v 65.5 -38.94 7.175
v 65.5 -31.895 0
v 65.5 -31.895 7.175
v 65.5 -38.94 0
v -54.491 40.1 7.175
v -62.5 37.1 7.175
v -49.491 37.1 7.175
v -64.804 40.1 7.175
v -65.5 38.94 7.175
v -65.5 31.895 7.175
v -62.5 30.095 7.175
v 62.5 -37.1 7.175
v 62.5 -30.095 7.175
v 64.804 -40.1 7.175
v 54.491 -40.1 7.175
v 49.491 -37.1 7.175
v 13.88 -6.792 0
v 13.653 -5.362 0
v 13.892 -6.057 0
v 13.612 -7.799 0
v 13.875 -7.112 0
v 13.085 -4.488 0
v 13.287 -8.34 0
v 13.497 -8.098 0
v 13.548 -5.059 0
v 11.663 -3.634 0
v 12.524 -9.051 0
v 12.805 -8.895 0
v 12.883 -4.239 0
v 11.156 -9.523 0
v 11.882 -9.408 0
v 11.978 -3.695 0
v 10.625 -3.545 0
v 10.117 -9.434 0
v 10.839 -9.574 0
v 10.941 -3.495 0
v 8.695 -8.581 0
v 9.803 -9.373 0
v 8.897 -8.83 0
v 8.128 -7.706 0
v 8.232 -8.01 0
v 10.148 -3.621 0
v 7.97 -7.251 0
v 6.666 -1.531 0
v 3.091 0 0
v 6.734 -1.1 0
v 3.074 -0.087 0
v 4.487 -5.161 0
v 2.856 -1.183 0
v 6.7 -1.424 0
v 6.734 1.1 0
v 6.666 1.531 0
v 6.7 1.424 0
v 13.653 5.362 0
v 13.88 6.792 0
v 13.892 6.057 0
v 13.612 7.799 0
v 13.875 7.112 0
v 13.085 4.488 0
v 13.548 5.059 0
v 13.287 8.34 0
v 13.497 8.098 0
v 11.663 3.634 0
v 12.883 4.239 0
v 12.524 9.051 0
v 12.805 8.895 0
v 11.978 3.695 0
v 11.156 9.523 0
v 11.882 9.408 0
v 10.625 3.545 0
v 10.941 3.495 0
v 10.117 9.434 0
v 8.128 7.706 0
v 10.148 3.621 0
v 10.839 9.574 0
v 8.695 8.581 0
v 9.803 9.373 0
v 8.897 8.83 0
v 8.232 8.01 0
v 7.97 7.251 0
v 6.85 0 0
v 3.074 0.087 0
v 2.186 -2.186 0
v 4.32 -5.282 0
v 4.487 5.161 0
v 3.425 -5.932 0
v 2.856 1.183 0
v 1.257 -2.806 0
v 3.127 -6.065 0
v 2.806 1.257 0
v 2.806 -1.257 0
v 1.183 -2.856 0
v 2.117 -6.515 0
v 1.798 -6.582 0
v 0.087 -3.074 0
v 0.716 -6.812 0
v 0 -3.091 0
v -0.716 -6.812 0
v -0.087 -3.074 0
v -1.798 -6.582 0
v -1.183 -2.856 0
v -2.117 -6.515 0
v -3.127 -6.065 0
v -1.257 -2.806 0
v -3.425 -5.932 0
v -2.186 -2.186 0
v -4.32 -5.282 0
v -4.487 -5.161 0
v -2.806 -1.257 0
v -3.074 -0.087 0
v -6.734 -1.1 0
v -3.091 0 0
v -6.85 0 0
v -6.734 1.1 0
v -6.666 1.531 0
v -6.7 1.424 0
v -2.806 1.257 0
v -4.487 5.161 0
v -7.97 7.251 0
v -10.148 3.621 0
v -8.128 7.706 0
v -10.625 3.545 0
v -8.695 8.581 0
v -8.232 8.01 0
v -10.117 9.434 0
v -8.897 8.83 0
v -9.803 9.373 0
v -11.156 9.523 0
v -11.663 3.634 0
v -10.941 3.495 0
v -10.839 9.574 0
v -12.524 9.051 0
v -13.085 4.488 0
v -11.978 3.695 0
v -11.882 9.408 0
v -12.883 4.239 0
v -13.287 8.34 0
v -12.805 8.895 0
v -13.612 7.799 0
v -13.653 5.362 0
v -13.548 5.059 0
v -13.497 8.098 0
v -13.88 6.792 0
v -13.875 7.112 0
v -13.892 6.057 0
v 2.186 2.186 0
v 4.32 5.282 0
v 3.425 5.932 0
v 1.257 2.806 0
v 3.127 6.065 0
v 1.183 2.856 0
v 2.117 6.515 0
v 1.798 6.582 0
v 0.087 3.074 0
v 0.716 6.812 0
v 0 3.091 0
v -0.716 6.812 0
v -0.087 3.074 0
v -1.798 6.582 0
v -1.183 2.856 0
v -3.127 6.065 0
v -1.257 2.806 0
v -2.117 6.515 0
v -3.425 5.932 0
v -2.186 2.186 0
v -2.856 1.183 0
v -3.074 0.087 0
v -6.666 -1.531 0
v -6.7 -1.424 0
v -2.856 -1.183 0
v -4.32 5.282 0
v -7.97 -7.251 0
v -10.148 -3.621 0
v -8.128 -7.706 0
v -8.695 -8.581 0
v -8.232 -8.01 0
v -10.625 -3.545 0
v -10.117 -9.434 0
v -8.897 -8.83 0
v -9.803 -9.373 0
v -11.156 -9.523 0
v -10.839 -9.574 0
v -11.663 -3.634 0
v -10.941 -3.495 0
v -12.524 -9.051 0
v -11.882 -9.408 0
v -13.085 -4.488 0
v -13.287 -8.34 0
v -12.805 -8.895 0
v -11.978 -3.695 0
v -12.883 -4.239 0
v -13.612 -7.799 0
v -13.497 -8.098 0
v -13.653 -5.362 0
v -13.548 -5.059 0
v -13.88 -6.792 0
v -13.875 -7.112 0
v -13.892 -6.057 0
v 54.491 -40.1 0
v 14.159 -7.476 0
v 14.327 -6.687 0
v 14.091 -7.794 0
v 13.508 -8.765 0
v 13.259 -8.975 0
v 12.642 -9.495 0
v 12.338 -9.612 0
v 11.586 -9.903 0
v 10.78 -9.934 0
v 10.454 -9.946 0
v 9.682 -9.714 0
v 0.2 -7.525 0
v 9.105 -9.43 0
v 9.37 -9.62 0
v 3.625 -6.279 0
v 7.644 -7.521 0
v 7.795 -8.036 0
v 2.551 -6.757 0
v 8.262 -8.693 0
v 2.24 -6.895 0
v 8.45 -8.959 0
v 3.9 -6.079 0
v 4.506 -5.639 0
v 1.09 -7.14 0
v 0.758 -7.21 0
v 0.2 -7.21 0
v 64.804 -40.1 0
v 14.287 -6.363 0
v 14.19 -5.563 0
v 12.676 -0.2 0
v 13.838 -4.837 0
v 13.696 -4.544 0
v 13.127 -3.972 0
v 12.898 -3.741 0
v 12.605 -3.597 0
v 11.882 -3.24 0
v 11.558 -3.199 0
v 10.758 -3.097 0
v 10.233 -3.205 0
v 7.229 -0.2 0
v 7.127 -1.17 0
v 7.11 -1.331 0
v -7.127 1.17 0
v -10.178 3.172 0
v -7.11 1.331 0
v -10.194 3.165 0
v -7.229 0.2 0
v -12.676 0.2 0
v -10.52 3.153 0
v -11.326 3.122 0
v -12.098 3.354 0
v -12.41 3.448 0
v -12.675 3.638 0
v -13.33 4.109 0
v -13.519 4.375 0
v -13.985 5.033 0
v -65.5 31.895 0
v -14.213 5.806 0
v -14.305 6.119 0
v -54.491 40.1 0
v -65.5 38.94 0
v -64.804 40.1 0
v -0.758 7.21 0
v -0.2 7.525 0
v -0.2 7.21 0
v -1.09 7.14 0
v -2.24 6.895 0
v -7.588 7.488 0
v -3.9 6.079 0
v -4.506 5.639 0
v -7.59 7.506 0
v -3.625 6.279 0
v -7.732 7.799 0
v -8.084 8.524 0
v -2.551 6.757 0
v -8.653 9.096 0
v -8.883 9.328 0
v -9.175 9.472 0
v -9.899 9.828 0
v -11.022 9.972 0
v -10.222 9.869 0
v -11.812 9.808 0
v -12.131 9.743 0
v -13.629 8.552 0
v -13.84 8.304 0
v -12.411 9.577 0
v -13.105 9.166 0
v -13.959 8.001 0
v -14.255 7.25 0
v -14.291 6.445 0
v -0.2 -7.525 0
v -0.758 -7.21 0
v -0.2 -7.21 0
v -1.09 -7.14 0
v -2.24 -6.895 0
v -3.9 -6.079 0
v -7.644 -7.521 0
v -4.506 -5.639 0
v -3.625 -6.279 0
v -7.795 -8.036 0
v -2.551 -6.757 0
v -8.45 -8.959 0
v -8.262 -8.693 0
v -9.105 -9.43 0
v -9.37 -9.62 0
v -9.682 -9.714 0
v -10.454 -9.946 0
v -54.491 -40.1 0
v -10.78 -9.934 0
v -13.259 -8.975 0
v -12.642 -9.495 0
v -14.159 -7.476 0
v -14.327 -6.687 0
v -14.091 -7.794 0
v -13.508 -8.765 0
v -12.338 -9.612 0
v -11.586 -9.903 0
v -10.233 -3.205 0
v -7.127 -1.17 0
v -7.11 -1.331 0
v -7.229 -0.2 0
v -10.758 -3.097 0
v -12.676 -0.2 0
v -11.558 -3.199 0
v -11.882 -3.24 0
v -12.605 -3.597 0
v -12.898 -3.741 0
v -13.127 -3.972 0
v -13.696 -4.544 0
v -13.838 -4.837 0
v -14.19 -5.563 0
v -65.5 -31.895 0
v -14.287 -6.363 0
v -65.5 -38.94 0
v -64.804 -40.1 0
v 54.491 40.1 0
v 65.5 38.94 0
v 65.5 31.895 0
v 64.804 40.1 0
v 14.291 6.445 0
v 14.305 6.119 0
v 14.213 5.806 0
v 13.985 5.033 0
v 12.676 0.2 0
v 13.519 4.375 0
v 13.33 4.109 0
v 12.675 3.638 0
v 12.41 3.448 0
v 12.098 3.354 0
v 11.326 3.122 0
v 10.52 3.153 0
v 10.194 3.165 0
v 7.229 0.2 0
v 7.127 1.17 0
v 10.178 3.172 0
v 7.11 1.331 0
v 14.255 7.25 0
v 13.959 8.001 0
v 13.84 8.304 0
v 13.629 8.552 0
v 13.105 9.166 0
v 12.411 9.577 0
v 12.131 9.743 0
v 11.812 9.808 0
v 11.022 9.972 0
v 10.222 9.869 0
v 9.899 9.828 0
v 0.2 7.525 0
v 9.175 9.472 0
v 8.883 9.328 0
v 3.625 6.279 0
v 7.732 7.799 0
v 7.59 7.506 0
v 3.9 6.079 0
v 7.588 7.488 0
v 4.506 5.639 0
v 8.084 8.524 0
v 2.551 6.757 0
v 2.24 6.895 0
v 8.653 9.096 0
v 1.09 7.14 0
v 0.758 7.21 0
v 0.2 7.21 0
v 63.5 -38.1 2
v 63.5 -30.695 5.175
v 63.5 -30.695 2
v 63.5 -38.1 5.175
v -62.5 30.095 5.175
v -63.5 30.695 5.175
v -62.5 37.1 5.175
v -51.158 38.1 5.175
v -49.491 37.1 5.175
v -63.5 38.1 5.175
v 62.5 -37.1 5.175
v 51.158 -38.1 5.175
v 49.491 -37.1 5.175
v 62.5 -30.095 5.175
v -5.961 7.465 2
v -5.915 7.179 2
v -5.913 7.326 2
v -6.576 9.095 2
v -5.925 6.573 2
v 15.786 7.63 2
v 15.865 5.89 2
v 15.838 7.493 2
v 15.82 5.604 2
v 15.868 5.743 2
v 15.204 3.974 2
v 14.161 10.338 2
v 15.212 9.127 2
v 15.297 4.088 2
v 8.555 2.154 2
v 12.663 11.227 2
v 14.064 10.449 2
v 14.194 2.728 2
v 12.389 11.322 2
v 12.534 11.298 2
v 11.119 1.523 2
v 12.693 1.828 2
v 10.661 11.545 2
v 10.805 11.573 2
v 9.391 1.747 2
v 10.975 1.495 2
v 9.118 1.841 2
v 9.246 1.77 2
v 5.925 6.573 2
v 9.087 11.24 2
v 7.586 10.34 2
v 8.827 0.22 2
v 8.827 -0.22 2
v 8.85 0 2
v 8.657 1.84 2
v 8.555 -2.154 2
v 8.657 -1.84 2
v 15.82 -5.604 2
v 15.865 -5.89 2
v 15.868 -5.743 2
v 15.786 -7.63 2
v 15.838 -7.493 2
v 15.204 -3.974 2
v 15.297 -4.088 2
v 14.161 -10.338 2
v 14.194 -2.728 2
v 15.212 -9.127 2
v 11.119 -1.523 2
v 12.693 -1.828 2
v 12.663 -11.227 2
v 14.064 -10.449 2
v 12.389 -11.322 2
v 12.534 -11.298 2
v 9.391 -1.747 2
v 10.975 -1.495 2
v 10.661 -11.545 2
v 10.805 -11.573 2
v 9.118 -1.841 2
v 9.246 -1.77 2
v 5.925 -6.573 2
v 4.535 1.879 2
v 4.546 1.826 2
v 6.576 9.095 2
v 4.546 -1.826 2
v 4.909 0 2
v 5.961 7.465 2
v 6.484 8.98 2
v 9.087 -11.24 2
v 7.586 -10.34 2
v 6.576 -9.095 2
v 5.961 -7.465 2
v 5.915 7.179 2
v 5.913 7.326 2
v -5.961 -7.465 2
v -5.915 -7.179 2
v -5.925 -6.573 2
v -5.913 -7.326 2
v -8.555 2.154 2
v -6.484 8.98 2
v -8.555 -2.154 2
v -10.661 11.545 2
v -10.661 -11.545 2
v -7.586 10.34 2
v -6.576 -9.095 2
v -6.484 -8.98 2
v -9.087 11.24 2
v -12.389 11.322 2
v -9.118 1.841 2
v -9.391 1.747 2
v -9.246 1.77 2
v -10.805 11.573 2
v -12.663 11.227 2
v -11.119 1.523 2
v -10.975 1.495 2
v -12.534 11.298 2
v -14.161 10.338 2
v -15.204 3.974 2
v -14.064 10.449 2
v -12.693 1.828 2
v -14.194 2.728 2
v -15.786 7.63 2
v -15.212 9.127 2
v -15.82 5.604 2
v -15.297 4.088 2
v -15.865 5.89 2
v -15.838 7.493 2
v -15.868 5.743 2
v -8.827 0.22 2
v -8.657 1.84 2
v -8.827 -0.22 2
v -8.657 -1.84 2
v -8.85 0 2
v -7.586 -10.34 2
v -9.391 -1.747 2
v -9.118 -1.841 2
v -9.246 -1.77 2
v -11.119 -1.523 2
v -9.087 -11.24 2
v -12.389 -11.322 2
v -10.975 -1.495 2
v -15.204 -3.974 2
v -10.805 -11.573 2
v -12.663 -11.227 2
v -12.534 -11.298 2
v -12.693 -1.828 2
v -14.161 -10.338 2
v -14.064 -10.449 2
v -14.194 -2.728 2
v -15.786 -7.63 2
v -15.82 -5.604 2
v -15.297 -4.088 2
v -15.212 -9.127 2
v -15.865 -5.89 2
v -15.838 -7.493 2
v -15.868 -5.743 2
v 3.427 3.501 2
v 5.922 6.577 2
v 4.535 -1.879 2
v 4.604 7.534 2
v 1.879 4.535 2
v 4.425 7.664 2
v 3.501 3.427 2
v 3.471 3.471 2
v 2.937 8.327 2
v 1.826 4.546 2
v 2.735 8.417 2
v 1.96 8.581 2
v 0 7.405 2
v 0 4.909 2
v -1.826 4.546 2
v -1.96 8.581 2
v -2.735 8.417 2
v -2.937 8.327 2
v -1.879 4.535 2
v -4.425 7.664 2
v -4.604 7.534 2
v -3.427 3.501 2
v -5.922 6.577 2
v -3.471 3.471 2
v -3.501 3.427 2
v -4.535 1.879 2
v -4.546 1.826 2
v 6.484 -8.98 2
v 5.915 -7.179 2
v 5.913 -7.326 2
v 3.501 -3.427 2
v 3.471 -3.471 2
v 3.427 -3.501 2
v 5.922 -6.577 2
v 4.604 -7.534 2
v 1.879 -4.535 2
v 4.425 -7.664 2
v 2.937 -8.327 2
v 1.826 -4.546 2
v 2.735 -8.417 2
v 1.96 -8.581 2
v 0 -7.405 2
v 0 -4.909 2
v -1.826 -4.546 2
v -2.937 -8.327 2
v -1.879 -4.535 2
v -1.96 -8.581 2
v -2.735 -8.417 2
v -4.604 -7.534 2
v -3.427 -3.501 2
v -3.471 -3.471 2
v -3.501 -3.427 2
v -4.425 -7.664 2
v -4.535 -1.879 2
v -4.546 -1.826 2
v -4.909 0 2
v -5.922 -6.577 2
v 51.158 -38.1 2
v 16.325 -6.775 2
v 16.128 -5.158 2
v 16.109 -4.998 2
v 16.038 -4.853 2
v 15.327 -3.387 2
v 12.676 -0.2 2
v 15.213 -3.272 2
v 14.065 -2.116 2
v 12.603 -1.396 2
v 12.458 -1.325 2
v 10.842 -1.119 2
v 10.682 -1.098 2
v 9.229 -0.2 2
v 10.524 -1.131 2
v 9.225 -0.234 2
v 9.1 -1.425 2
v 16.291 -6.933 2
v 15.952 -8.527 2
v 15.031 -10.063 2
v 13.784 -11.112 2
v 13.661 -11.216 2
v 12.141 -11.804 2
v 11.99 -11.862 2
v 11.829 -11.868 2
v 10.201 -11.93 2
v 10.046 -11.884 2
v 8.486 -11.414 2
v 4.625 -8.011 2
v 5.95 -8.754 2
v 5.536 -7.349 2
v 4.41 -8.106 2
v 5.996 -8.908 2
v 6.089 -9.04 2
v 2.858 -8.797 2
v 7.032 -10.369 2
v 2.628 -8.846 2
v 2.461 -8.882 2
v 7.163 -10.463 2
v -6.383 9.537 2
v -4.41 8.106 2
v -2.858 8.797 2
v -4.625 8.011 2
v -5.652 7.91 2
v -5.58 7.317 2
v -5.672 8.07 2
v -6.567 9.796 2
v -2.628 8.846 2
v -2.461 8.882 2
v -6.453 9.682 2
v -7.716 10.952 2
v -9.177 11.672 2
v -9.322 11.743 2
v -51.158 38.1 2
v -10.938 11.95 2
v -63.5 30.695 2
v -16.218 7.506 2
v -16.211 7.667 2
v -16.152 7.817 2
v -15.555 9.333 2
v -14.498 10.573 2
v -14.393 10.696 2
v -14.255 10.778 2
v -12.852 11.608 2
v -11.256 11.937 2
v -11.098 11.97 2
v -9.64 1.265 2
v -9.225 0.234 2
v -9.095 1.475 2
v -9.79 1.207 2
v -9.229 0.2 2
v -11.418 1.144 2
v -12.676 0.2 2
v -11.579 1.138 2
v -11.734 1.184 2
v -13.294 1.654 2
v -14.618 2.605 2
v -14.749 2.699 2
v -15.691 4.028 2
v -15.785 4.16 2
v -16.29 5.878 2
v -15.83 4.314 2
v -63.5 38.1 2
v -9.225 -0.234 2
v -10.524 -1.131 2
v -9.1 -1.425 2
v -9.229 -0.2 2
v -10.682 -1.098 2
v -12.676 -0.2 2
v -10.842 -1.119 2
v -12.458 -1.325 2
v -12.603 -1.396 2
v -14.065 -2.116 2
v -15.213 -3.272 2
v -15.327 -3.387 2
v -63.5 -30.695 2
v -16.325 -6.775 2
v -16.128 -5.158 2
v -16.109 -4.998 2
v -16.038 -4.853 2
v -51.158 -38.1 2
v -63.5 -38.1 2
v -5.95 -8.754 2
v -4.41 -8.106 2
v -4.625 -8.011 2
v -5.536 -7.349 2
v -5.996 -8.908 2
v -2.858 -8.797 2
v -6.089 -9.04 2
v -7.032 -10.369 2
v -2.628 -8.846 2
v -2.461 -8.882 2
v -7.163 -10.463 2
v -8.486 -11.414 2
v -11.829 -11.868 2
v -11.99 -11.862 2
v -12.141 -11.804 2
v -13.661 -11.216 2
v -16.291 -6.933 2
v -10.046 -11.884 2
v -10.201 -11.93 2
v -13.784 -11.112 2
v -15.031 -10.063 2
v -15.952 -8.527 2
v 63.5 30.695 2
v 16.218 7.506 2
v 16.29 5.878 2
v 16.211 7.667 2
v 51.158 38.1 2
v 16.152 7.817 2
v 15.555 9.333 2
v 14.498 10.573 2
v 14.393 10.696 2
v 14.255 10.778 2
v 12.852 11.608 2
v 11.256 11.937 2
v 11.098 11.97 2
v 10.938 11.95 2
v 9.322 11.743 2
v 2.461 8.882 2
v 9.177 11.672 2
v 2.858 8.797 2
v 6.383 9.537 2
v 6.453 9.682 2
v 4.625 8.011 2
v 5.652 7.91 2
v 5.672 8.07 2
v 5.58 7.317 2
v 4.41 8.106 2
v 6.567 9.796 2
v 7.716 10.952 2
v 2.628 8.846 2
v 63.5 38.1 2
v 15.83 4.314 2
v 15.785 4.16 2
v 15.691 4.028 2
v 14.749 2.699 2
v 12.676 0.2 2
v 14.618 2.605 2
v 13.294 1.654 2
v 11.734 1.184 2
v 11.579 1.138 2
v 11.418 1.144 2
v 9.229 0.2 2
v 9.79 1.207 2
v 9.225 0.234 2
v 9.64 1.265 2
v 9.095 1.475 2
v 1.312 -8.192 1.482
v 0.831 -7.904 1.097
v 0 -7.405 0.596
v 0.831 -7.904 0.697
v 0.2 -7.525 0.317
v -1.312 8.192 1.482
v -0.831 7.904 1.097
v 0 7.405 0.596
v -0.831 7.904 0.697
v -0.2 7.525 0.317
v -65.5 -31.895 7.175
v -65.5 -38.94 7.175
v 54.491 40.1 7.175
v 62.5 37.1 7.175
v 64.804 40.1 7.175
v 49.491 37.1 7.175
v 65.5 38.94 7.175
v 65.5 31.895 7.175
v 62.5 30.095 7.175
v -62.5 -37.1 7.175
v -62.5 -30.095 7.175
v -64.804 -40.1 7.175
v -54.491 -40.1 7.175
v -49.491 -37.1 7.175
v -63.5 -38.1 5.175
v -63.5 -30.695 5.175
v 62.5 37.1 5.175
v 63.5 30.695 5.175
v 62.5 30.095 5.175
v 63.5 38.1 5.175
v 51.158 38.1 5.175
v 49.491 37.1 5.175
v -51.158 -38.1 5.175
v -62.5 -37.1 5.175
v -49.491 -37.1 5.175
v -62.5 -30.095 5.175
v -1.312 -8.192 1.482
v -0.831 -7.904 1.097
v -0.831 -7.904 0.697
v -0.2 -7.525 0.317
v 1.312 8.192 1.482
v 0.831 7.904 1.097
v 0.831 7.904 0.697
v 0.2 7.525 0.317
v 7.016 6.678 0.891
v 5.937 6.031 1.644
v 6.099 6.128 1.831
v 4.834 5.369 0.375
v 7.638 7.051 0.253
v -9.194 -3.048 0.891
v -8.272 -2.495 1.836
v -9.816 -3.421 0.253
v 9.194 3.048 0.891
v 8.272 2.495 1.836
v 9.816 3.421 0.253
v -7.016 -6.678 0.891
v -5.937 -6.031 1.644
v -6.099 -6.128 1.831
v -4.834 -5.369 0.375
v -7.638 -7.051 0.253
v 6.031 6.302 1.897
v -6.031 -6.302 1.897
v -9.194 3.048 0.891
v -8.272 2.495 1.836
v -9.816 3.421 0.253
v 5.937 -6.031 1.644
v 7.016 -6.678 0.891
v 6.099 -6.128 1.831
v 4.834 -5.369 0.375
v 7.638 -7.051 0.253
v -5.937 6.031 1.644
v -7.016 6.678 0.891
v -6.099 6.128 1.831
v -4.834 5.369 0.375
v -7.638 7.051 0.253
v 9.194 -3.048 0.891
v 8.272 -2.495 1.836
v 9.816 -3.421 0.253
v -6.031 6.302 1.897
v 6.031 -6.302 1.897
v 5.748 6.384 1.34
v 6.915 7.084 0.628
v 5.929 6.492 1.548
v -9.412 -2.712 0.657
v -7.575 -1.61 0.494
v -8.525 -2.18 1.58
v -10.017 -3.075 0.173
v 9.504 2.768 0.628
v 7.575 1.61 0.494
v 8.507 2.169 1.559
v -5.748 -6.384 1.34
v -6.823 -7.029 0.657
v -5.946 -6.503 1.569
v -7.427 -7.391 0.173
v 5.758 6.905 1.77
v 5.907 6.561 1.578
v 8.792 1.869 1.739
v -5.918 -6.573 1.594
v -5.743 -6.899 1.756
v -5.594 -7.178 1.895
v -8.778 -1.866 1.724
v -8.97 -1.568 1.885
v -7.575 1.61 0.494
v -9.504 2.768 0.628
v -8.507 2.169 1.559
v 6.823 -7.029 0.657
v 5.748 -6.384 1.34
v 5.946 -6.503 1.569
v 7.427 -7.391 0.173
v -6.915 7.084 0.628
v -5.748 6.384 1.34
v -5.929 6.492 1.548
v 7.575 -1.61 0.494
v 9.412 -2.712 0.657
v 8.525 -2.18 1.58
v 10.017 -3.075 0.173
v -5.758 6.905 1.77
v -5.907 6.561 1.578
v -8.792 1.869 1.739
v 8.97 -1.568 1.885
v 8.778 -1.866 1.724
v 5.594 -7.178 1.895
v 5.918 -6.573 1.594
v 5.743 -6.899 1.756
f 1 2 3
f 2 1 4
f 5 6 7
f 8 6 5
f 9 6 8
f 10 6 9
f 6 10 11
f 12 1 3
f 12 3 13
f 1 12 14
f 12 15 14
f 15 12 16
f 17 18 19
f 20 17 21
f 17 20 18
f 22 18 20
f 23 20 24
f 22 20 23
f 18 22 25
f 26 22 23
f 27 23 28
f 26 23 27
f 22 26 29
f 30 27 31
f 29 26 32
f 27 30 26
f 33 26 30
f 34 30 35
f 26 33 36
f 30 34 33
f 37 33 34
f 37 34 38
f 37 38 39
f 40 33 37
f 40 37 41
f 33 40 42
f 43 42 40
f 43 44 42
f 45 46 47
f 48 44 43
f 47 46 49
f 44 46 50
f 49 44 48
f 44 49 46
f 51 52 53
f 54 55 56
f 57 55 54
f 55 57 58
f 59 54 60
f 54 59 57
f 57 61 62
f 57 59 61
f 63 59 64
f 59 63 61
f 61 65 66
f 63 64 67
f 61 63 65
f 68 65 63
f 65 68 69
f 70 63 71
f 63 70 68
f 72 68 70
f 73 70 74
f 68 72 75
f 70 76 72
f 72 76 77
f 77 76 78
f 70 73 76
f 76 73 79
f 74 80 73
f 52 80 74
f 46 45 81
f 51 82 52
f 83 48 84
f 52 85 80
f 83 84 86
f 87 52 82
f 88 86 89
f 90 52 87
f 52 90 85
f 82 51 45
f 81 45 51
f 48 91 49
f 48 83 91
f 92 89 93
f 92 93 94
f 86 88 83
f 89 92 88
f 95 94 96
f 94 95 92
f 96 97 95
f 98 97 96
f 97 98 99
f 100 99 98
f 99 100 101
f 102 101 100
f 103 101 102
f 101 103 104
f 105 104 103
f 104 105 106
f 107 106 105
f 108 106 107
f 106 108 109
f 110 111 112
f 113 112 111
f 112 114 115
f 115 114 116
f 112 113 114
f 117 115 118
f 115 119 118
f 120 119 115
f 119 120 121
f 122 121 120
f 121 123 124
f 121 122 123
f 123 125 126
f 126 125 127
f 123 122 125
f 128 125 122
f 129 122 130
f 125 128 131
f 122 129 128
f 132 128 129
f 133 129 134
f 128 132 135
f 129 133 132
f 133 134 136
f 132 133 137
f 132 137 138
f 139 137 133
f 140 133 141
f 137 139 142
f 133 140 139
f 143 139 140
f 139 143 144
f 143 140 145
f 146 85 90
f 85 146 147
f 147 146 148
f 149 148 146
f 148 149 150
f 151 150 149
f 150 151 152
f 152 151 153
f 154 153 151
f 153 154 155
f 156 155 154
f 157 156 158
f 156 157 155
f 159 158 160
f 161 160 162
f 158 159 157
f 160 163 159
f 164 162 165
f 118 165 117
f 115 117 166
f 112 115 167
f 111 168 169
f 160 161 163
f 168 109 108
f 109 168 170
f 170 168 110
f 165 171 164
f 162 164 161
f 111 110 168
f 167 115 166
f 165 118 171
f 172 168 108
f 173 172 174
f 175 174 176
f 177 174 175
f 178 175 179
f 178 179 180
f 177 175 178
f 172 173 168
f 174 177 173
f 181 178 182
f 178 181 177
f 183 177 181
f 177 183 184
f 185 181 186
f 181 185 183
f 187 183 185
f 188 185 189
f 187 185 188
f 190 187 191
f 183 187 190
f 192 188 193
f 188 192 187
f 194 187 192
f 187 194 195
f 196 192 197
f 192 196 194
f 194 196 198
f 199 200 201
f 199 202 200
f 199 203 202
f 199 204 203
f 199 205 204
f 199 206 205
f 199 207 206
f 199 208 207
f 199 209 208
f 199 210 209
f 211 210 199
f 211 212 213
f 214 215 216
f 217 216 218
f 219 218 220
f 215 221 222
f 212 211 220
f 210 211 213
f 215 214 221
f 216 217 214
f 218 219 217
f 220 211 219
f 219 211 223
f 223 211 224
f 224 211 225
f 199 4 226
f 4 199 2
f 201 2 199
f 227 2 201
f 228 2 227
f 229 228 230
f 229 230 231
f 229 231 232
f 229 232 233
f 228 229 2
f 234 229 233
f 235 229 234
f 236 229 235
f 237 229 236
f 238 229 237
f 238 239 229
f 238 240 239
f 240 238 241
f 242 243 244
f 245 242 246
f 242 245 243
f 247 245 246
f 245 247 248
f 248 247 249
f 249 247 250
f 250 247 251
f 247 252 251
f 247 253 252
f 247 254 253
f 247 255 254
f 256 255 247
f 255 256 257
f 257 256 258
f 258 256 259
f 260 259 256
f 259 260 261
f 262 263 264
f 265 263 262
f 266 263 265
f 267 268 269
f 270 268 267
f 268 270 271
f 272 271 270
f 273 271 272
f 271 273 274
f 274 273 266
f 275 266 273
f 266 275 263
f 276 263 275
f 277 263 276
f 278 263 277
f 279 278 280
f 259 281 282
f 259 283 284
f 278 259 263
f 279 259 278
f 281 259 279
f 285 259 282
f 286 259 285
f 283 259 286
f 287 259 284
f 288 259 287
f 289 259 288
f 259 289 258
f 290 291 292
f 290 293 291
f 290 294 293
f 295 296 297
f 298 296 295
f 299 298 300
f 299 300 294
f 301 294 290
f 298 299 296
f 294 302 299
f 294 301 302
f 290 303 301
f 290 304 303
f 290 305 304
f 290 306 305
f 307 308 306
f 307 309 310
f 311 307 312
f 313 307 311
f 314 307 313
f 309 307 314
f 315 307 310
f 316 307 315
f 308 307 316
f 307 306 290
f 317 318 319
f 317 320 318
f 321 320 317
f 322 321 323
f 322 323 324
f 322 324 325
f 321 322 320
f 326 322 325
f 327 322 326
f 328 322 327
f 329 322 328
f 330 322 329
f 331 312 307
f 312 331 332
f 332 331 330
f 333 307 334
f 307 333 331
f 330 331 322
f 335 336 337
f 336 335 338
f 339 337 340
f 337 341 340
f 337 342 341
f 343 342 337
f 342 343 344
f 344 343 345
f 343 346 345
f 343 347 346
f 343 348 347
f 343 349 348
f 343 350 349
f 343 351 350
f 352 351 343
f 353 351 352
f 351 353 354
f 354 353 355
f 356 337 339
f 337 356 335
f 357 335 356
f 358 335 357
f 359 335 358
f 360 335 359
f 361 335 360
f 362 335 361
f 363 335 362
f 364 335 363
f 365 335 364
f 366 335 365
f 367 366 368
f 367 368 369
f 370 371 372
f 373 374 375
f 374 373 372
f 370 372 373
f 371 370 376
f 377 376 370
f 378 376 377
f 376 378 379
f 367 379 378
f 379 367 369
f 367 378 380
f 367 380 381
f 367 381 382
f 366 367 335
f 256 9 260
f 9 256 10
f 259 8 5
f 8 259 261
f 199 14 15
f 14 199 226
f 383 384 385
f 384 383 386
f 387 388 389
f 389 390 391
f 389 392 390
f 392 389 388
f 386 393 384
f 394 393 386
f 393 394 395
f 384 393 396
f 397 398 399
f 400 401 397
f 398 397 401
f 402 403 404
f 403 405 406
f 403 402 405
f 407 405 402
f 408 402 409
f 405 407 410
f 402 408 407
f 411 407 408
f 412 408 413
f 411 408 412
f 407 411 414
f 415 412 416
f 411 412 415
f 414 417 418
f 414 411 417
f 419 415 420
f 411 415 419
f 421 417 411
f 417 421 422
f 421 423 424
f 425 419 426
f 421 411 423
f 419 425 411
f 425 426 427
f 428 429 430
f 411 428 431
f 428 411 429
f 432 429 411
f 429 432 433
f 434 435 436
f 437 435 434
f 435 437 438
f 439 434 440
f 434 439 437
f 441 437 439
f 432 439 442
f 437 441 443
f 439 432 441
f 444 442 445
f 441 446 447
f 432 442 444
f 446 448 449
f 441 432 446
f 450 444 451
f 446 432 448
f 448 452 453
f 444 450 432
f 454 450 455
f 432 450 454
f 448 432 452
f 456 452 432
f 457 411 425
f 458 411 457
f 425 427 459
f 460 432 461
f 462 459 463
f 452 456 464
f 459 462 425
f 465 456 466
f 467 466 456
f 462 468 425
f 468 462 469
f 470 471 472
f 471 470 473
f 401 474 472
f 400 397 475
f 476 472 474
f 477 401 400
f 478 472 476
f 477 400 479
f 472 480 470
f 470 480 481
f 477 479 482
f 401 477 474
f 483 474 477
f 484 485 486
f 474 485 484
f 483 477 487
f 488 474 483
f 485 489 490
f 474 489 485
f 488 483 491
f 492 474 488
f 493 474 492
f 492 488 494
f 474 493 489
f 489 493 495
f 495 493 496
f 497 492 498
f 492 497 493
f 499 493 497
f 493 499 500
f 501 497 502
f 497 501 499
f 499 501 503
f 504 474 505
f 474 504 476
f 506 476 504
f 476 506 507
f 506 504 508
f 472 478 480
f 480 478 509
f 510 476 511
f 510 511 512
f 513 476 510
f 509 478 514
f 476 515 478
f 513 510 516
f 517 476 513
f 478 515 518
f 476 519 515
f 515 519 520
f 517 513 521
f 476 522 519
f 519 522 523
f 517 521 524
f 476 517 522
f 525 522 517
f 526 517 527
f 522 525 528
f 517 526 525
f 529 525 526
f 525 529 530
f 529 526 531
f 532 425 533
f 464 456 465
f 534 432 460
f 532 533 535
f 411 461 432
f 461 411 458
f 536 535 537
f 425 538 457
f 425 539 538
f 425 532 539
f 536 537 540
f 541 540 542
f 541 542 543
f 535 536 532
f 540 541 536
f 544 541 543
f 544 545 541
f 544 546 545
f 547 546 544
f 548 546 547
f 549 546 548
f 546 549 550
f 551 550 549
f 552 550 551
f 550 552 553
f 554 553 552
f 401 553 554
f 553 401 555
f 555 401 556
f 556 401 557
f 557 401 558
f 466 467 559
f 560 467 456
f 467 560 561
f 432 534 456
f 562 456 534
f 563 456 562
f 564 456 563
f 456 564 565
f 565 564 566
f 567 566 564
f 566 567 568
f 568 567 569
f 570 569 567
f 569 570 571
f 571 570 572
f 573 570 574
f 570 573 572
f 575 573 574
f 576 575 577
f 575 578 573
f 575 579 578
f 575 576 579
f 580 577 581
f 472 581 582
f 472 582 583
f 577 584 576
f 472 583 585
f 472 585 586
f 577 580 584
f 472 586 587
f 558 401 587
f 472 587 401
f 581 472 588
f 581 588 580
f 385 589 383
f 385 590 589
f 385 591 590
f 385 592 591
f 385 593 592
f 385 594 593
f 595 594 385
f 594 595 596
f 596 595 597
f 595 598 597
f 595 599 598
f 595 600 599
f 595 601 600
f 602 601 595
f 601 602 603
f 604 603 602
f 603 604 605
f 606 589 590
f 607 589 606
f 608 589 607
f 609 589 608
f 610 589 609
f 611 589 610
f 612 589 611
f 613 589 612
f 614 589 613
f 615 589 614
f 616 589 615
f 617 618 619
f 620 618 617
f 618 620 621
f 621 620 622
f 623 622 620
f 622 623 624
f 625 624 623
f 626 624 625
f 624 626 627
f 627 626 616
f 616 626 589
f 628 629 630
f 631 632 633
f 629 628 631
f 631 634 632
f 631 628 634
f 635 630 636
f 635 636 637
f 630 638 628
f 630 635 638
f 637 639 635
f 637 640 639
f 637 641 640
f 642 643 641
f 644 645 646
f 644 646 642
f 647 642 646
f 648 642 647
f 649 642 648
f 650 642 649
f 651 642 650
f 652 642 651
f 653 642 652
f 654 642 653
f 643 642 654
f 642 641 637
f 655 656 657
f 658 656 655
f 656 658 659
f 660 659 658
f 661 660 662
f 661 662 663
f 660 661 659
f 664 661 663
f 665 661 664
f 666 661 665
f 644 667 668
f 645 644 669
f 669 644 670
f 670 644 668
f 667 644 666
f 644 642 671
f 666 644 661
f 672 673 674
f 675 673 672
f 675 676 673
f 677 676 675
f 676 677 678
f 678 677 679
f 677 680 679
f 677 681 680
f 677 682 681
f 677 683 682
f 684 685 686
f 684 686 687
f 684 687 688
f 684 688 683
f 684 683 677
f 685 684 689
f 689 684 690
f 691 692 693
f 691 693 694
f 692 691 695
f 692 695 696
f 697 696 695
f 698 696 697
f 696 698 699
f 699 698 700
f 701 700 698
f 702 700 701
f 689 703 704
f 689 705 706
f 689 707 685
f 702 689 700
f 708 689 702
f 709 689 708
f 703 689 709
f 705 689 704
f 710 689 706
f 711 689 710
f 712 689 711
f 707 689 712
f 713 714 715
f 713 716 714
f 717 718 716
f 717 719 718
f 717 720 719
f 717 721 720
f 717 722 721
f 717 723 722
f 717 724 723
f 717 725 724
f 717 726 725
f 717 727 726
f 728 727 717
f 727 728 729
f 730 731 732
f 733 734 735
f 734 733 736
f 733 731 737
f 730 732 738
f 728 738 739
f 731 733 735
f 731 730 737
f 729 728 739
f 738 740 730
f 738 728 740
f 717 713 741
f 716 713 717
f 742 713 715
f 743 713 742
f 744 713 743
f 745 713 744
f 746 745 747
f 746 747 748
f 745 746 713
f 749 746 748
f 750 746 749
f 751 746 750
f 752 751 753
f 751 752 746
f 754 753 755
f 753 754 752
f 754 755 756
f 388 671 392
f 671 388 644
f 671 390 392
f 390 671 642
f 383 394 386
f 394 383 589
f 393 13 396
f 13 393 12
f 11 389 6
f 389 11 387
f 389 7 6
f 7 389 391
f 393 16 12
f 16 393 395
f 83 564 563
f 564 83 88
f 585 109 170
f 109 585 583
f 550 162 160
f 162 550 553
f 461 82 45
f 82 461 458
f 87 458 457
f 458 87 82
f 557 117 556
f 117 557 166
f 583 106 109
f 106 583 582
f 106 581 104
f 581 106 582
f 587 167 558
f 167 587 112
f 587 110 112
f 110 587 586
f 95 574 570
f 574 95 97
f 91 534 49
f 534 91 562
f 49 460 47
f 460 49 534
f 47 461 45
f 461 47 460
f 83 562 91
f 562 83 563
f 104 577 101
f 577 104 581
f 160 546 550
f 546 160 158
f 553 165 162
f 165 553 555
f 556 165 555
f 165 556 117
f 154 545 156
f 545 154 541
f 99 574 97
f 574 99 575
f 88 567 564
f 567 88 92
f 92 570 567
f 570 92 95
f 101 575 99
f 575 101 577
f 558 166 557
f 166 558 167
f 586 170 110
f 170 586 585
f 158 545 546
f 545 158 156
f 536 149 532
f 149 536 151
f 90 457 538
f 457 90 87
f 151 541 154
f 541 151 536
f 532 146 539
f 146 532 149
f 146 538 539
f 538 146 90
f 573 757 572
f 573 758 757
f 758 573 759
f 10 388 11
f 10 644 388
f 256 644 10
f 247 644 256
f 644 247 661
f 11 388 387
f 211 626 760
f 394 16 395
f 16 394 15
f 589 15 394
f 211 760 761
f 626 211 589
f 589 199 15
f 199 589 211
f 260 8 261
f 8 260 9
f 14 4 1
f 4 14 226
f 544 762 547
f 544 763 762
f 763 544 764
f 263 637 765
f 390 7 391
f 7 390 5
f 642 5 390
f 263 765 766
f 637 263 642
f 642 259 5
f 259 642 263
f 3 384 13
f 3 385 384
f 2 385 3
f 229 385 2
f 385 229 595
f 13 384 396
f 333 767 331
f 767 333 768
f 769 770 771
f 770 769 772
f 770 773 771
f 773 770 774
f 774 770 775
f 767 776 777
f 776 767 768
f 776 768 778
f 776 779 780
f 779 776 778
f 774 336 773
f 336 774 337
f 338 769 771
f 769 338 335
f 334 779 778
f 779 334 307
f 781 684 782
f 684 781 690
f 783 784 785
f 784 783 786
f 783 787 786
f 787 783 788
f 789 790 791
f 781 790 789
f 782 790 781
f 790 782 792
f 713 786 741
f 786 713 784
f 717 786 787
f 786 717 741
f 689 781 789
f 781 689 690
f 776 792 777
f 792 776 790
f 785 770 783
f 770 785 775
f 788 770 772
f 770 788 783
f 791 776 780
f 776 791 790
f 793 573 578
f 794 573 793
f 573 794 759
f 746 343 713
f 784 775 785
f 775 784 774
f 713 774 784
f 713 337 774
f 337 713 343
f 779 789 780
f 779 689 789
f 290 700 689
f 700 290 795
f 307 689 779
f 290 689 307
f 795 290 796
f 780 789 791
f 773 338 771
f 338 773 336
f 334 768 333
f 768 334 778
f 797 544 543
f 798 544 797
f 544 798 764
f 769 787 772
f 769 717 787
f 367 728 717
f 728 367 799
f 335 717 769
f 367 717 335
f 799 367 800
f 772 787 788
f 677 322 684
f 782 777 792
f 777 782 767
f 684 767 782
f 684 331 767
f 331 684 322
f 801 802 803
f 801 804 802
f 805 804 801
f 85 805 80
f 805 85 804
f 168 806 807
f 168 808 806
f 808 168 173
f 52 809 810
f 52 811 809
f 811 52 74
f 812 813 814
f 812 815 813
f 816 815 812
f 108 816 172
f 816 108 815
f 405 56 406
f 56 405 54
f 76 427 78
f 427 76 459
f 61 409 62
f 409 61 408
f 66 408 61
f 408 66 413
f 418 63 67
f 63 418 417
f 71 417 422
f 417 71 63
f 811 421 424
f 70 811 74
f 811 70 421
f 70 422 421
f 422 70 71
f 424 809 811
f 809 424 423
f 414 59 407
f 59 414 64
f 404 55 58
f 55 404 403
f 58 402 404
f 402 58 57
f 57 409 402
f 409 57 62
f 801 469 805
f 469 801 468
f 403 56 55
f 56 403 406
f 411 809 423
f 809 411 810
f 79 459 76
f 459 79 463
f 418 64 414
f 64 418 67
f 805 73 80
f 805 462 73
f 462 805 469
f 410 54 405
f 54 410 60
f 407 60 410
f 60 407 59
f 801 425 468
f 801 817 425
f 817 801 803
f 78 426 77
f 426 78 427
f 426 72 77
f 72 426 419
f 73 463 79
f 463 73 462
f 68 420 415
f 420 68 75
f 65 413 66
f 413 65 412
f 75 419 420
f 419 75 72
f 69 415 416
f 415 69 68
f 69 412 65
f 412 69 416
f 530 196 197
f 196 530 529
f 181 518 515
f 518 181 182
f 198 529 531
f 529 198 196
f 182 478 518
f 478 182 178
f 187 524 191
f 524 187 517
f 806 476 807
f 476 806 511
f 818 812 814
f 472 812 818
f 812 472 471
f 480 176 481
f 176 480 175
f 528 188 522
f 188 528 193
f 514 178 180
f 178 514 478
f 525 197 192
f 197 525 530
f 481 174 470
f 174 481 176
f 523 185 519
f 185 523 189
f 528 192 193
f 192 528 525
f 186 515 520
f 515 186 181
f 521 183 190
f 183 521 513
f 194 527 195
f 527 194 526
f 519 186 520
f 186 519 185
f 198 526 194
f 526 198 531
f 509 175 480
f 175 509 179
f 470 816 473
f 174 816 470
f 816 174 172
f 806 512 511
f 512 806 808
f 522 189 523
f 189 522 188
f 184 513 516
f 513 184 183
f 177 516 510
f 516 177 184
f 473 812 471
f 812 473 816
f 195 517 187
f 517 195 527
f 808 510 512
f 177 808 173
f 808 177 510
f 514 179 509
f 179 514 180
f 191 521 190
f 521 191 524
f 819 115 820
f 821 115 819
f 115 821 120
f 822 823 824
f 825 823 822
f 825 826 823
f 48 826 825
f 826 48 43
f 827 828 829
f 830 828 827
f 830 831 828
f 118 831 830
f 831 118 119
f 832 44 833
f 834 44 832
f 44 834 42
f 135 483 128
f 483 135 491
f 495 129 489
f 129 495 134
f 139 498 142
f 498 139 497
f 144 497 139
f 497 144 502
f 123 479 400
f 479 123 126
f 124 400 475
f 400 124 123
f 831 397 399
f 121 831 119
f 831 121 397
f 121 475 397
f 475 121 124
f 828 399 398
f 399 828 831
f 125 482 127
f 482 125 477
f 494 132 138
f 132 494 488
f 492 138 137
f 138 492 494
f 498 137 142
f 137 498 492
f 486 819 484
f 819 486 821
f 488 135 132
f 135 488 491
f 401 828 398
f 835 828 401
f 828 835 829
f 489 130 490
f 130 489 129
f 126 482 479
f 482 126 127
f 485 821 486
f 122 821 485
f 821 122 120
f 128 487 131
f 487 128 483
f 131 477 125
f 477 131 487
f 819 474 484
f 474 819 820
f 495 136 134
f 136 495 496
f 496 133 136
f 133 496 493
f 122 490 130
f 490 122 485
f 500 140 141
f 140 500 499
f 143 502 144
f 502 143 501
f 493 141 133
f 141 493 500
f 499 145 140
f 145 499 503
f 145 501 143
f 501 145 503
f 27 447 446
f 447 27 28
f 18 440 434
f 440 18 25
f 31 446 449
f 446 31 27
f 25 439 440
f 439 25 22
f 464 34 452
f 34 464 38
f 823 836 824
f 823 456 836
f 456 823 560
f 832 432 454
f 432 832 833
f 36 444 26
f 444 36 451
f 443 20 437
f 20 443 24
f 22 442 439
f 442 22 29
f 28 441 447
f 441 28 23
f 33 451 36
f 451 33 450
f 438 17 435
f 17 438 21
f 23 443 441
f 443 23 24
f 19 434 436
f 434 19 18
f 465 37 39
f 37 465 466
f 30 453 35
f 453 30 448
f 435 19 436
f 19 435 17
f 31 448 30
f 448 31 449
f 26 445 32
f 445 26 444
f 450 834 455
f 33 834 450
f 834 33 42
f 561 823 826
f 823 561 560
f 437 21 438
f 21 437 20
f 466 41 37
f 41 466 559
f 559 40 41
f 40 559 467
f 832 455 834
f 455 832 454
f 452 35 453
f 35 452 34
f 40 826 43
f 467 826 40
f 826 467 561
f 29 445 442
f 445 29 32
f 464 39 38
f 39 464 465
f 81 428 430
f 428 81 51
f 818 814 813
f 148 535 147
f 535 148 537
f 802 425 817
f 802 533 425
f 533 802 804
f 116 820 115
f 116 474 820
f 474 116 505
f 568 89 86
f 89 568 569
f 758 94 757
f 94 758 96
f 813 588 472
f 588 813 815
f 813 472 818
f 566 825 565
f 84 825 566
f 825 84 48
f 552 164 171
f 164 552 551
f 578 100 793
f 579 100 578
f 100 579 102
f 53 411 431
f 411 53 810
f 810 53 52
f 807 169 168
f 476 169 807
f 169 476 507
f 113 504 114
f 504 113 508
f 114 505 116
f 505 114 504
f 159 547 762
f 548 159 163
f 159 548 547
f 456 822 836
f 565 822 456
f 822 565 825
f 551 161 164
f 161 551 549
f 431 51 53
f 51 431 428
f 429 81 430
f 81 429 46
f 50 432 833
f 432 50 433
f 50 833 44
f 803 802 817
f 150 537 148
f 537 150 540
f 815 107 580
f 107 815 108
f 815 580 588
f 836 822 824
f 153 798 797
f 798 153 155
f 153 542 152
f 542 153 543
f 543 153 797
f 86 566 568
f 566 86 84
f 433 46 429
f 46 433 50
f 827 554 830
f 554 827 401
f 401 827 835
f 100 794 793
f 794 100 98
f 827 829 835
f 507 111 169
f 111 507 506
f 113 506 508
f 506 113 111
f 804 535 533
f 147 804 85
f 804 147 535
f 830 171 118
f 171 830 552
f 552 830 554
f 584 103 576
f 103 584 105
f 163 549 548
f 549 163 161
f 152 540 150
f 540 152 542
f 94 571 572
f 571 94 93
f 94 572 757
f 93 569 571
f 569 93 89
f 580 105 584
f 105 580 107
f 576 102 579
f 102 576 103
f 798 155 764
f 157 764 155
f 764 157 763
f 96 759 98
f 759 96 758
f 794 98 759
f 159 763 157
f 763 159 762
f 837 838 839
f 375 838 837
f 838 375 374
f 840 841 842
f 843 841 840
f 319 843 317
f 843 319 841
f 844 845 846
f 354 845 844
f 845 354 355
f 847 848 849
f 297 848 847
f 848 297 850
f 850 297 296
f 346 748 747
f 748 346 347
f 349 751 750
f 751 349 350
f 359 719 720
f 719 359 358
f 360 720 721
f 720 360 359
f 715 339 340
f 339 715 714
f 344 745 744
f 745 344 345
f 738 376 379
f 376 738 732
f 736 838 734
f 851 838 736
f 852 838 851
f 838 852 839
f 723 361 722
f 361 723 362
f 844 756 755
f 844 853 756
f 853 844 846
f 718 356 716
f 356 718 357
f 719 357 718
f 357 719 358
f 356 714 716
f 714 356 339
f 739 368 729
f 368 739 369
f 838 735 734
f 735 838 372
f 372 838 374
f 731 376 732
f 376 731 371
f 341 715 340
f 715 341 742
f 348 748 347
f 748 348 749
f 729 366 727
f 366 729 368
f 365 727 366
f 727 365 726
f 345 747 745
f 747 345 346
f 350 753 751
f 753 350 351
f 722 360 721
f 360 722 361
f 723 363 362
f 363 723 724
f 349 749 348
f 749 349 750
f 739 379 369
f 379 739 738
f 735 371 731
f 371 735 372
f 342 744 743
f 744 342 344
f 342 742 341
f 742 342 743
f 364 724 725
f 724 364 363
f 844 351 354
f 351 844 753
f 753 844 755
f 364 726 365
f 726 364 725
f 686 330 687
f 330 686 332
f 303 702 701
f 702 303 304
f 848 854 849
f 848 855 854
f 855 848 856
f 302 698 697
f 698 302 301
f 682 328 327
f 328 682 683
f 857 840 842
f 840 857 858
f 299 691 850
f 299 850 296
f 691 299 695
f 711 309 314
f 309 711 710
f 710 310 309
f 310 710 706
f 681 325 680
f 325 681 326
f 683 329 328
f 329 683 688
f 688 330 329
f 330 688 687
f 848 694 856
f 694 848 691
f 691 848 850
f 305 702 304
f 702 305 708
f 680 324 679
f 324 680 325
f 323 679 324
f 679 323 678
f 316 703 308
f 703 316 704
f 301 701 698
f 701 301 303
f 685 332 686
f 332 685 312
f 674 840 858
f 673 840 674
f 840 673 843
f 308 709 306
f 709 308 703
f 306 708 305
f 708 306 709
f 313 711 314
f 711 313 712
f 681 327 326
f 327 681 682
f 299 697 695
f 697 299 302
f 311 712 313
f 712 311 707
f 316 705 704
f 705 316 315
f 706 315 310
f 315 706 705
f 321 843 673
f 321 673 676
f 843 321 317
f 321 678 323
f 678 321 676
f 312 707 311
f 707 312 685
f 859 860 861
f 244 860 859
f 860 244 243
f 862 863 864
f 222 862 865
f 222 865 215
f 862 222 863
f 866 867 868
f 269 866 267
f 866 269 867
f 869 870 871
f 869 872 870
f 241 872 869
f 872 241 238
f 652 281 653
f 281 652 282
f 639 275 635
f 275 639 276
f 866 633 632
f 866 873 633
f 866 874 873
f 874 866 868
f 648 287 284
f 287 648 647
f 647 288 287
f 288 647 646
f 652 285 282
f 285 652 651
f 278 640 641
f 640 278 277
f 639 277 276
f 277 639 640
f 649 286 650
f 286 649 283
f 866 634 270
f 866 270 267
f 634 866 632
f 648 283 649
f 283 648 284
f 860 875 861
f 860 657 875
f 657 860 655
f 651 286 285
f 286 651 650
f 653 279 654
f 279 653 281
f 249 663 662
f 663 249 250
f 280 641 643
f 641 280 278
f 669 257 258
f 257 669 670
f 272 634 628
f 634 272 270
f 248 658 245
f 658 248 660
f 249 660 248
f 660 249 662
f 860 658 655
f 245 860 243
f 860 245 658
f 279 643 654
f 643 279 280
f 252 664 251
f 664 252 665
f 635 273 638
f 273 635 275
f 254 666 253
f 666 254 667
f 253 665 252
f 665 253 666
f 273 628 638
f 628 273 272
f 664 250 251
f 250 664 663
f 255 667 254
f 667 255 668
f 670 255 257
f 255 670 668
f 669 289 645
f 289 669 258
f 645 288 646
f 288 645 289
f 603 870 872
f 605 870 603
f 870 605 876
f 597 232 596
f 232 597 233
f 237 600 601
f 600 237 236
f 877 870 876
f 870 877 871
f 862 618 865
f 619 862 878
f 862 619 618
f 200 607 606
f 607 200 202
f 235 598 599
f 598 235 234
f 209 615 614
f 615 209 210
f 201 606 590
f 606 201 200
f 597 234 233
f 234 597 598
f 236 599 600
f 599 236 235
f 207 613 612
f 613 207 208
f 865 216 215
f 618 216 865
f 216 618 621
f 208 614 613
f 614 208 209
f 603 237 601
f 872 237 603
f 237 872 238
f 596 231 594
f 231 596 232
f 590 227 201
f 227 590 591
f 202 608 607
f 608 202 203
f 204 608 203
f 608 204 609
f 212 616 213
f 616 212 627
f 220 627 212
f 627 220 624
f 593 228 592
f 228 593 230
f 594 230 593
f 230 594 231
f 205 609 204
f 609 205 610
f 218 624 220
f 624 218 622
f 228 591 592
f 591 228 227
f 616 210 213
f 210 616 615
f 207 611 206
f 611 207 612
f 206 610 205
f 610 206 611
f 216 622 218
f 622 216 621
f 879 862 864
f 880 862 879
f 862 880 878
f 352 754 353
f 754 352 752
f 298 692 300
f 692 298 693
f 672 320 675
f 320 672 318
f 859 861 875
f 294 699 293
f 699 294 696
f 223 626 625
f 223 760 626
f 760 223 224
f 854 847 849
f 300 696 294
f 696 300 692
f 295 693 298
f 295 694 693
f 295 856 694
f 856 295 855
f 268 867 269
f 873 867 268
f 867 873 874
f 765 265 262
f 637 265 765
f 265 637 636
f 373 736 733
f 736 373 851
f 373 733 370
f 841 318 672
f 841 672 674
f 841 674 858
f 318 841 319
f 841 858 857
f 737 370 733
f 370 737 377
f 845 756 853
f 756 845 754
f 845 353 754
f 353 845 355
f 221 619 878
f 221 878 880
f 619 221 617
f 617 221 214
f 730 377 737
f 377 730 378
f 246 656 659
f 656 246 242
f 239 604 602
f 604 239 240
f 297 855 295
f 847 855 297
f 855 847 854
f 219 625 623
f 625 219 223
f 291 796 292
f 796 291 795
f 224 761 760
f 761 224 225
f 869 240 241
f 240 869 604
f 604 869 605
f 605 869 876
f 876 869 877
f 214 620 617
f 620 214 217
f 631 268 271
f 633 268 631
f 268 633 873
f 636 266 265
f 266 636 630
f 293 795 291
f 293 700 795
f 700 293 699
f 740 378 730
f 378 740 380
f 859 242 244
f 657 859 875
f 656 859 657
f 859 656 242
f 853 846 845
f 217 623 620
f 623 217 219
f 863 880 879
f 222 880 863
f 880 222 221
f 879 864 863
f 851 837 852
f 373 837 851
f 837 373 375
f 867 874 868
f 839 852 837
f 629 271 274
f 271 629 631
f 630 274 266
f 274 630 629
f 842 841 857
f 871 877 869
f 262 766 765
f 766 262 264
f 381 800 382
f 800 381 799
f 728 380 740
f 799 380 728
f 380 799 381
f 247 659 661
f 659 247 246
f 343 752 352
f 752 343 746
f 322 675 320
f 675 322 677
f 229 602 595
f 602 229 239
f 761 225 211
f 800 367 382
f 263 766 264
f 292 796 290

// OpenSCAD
// [FL_INDEX: keywords="openscad, 3d_parametric, Customizable_Picture_Frame, csg_solid" | COT="Parametric OpenSCAD design from 3DCodeverse"]
// Title: Customizable Picture Frame

// 8.5 x 11 paper holder

/* [Frame Dimensions] */

// Assembled or plated or individual parts?
part = 0; //[0:Preview, 1:Plate, 2:Center, 3:Left arm, 4:Right arm]

in = 25.4*1;
// Thickness of holder in mm
thick = 2;

// Paper width in inches or mm (use one)
widthInches = 5;
widthMM = 0;
// Paper height in inches or mm (use one)
heightInches = 3;
heightMM = 0;
// Paper thickness in inches or mm (use one)
thicknessInches = .125;
thicknessMM = 0;
// Arm width in inches or mm (use one)
armInches = .5;
armMM = 0;
band = armInches*in+armMM;

x=widthInches*in+widthMM;
y=heightInches*in+heightMM;
z=thicknessInches*in+thicknessMM;

r = x/y;
angle=atan(r);

xi = x-band/2;
yi=y-band/2;
xi=x;
yi=y;

diag = sqrt(xi*xi+yi*yi);

// Radius of center screw in mm
sr = 3;
// Gap for spacing between parts (tune for your printer)
gap=0.4;

spacing = 1.1*band;

module arm() {
intersection() {
	rotate([0,0,angle]) cube([band,2*y,z+3*thick], center=true);
	difference() {
		cube([x+2*thick,y+2*thick,z+2*thick],center=true);
		cube([x,y,z], center=true);
		translate([0,0,z/2]) cube([x-2,y-2,z+thick], center=true);
		translate([0,0,-(z/2+thick)-.1]) cylinder(r1=sr, r2=sr+thick, h=thick+.2);
		}
	}
}

module X () {
	arm();
	mirror([1,0,0]) arm();
	}

module plug(r, h) {
	//echo(r,h);
	cylinder(r1=r, r2=r+h, h=h, center=true);
	}

module centerCut() {
	translate([0,0,-z/2-thick/2]) {
		rotate([0,0,90-angle]) {
			cube([2*band,band/3,thick+1], center=true);
			translate([band,0,0]) plug(band/5,thick+1);
			translate([-band,0,0]) plug(band/5,thick+1);
			}
		rotate([0,0,90+angle]) {
			cube([2*band,band/3,thick+1], center=true);
			translate([band,0,0]) plug(band/5,thick+1);
			translate([-band,0,0]) plug(band/5,thick+1);
			}
		plug(band/2,thick+1);
		}
	}

module centerHole() {
	translate([0,0,-z/2-thick/2]) {
		rotate([0,0,90-angle]) {
			cube([2*band+2*gap,band/3+2*gap,thick+1], center=true);
			translate([band,0,0]) plug(band/5+gap,thick+1);
			translate([-band,0,0]) plug(band/5+gap,thick+1);
			}
		rotate([0,0,90+angle]) {
			cube([2*band+2*gap,band/3+2*gap,thick+1], center=true);
			translate([band,0,0]) plug(band/5+gap,thick+1);
			translate([-band,0,0]) plug(band/5+gap,thick+1);
			}
		plug(band/2+gap,thick+1);
		}
	cube([x,gap,band], center=true);
	cube([gap,y,band], center=true);;
	}

module center() {
	intersection () {
		X();
		centerCut();
		}
	}

module anArm() {
    ht=z+2*thick;
	intersection() {
		difference() {
			X();
			centerHole();
			}
		translate([0,0,-ht/2]) cube([x/2+thick,y/2+thick,ht]);
		}
	}

module plate() {
	translate([-spacing/2,-band,0]) rotate([0,0,90]) center();
	rotate([0,0,angle]) anArm();
	translate([spacing,0,0]) rotate([0,0,angle]) anArm();
	translate([-spacing,0,0]) mirror([1,0,0]) rotate([0,0,angle]) anArm();
	translate([-2*spacing,0,0]) mirror([1,0,0]) rotate([0,0,angle]) anArm();
	}

module preview() {
	center();
	difference() {
			X();
			centerHole();
			}
		}

translate([0,0,z/2+thick]) {
	if (part==0) preview();
	if (part==1) plate();
	if (part==2) center();
	if (part==3) anArm();
	if (part==4) mirror([1,0,0]) anArm();
	}
